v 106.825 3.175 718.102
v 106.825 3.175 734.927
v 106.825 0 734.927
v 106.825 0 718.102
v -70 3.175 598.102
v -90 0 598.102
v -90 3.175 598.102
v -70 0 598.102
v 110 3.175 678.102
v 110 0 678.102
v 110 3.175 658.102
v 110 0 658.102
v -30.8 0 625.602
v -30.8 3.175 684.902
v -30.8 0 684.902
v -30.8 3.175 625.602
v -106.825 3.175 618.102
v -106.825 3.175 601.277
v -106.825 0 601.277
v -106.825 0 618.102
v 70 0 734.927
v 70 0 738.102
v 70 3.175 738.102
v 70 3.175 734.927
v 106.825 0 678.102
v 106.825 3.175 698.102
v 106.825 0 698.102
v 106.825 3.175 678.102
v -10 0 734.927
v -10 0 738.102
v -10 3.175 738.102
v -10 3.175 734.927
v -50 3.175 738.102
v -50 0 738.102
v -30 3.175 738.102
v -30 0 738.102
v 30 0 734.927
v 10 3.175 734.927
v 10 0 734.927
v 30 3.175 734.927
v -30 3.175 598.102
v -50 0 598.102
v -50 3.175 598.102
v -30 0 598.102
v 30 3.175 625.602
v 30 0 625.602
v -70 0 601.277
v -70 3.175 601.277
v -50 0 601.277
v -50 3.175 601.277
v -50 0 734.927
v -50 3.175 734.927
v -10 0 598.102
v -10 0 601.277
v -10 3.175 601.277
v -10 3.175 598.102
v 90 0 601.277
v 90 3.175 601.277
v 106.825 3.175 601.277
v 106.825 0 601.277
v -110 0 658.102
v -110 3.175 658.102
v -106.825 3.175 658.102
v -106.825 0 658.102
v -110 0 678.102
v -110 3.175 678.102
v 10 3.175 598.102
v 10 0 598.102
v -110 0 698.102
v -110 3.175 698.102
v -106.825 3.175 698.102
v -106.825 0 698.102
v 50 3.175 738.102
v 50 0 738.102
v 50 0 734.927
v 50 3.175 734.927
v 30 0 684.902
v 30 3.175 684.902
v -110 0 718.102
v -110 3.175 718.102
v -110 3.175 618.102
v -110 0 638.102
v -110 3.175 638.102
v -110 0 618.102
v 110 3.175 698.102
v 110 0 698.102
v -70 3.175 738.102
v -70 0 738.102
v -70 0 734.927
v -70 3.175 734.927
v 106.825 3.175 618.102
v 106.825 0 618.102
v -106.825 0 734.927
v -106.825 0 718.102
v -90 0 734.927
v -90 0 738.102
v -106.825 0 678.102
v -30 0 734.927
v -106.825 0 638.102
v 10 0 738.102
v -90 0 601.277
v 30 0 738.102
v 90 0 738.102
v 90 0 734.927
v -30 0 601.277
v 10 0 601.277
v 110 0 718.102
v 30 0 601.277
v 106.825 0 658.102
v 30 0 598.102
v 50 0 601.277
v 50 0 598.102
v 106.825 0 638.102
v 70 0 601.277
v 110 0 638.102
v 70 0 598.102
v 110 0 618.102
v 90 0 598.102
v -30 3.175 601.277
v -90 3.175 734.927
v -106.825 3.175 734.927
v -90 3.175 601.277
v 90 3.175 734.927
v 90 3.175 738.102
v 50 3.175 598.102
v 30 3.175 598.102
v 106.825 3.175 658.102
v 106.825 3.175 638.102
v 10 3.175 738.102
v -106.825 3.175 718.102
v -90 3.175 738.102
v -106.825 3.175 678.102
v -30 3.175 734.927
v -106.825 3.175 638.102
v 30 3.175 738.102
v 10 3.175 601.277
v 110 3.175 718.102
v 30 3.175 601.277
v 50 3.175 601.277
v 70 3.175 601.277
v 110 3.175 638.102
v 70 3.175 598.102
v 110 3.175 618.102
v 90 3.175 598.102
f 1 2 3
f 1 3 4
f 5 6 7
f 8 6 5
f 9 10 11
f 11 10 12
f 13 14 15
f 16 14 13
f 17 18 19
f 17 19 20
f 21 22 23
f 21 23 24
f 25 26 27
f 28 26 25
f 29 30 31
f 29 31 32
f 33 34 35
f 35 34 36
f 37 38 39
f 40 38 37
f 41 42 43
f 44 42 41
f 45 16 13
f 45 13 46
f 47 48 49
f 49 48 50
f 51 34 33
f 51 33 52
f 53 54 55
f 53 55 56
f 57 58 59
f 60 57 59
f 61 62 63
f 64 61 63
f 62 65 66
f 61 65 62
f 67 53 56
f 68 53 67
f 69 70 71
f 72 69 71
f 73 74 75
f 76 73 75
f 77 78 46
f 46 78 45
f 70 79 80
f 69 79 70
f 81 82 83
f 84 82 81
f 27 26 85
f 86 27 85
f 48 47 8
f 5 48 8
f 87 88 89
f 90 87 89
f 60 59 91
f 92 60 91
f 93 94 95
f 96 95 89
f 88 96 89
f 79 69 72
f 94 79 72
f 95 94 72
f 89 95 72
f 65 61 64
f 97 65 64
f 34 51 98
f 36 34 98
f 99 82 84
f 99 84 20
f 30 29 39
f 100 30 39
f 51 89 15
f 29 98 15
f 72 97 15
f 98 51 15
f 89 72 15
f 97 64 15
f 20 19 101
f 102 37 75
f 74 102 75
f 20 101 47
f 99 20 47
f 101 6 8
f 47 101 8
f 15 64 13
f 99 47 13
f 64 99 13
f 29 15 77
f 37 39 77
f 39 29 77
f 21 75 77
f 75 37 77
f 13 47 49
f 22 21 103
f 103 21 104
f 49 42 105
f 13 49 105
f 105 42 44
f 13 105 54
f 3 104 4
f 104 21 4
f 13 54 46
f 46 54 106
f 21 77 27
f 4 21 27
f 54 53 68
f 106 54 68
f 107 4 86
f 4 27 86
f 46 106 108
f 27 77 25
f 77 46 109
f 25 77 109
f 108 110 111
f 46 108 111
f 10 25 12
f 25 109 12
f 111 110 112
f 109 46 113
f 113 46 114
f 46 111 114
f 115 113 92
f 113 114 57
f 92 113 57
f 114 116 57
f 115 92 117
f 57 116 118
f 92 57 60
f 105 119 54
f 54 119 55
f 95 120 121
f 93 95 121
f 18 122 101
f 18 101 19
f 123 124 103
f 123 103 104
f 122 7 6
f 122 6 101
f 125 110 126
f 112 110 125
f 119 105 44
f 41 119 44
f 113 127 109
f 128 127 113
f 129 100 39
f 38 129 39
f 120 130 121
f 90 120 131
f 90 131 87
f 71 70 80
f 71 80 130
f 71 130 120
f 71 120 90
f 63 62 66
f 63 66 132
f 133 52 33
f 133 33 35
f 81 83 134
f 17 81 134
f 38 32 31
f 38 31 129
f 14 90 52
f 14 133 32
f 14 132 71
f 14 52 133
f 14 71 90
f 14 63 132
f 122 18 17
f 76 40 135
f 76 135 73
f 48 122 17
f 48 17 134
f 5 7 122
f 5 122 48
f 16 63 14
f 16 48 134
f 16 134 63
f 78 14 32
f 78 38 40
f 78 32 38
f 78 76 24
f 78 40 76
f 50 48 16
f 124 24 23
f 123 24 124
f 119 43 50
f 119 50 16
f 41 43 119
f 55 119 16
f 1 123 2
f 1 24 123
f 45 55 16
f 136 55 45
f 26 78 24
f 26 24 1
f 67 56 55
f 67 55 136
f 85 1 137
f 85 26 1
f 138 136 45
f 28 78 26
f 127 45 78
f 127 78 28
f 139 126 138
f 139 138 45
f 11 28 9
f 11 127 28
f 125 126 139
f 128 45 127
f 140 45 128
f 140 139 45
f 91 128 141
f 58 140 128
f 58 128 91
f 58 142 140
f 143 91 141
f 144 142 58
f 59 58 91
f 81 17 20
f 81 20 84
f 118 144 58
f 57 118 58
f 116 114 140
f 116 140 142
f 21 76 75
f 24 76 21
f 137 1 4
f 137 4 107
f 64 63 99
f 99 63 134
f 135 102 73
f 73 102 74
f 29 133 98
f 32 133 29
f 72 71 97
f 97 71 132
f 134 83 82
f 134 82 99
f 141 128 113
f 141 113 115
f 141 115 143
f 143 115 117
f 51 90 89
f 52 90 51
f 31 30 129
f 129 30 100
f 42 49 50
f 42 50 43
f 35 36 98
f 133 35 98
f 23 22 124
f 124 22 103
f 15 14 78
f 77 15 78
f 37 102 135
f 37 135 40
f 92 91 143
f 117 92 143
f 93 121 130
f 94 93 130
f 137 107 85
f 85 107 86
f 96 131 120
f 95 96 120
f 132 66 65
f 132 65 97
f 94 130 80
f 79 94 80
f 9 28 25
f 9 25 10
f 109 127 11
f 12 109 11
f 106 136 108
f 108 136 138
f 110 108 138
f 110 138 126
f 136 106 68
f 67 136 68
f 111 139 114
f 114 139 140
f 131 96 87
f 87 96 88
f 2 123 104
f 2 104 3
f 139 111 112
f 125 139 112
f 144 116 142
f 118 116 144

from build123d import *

# Parameters (mm, degrees)
SKETCH40_W          = 220
SKETCH40_H          = 140
BOSS_EXTRUDE7_DEPTH = 3.175
SKETCH41_W          = 20
SKETCH41_H          = 3.175
SKETCH41_W_2        = 3.175
SKETCH41_H_2        = 20
CUT_EXTRUDE21_DEPTH = 3.175
SKETCH53_W          = 60.8
SKETCH53_H          = 59.3
CUT_EXTRUDE26_DEPTH = 3.175


with BuildPart() as part:
    # Sketch40 → Boss-Extrude7 (new body)
    with BuildSketch(Plane(origin=(0, 0, 0), x_dir=(1, 0, 0), z_dir=(0, 1, 0))):
        with Locations((-4.2e-06, -668.101928689)):
            Rectangle(SKETCH40_W, SKETCH40_H)
    extrude(amount=BOSS_EXTRUDE7_DEPTH)

    # Sketch41 → Cut-Extrude21 (cut)
    with BuildSketch(Plane(origin=(0, 3.175, 0), x_dir=(1, 0, 0), z_dir=(0, 1, 0))):
        with Locations((59.9999958, -736.514428689)):
            Rectangle(SKETCH41_W, SKETCH41_H)
        Polygon((109.9999958, -738.101928689), (89.9999958, -738.101928689), (89.9999958, -734.926928689), (106.8249958, -734.926928689), (106.8249958, -718.101928689), (109.9999958, -718.101928689), align=None)
        with Locations((19.9999958, -736.514428689)):
            Rectangle(SKETCH41_W, SKETCH41_H)
        with Locations((-20.0000042, -736.514428689)):
            Rectangle(SKETCH41_W, SKETCH41_H)
        with Locations((-60.0000042, -736.514428689)):
            Rectangle(SKETCH41_W, SKETCH41_H)
        Polygon((-90.0000042, -738.101928689), (-90.0000042, -734.926928689), (-106.8250042, -734.926928689), (-106.8250042, -718.101928689), (-110.0000042, -718.101928689), (-110.0000042, -738.101928689), align=None)
        with Locations((59.9999958, -599.689428689)):
            Rectangle(SKETCH41_W, SKETCH41_H)
        Polygon((109.9999958, -598.101928689), (89.9999958, -598.101928689), (89.9999958, -601.276928689), (106.8249958, -601.276928689), (106.8249958, -618.101928689), (109.9999958, -618.101928689), align=None)
        with Locations((19.9999958, -599.689428689)):
            Rectangle(SKETCH41_W, SKETCH41_H)
        with Locations((-20.0000042, -599.689428689)):
            Rectangle(SKETCH41_W, SKETCH41_H)
        with Locations((-60.0000042, -599.689428689)):
            Rectangle(SKETCH41_W, SKETCH41_H)
        Polygon((-90.0000042, -598.101928689), (-90.0000042, -601.276928689), (-106.8250042, -601.276928689), (-106.8250042, -618.101928689), (-110.0000042, -618.101928689), (-110.0000042, -598.101928689), align=None)
        with Locations((108.4124958, -648.101928689)):
            Rectangle(SKETCH41_W_2, SKETCH41_H_2)
        with Locations((108.4124958, -688.101928689)):
            Rectangle(SKETCH41_W_2, SKETCH41_H_2)
        with Locations((-108.4125042, -648.101928689)):
            Rectangle(SKETCH41_W_2, SKETCH41_H_2)
        with Locations((-108.4125042, -688.101928689)):
            Rectangle(SKETCH41_W_2, SKETCH41_H_2)
    extrude(amount=-CUT_EXTRUDE21_DEPTH, mode=Mode.SUBTRACT)

    # Sketch53 → Cut-Extrude26 (cut)
    with BuildSketch(Plane(origin=(0, 3.175, 0), x_dir=(1, 0, 0), z_dir=(0, 1, 0))):
        with Locations((-0.4, -655.251928689)):
            Rectangle(SKETCH53_W, SKETCH53_H)
    extrude(amount=-CUT_EXTRUDE26_DEPTH, mode=Mode.SUBTRACT)


solid = part.part
